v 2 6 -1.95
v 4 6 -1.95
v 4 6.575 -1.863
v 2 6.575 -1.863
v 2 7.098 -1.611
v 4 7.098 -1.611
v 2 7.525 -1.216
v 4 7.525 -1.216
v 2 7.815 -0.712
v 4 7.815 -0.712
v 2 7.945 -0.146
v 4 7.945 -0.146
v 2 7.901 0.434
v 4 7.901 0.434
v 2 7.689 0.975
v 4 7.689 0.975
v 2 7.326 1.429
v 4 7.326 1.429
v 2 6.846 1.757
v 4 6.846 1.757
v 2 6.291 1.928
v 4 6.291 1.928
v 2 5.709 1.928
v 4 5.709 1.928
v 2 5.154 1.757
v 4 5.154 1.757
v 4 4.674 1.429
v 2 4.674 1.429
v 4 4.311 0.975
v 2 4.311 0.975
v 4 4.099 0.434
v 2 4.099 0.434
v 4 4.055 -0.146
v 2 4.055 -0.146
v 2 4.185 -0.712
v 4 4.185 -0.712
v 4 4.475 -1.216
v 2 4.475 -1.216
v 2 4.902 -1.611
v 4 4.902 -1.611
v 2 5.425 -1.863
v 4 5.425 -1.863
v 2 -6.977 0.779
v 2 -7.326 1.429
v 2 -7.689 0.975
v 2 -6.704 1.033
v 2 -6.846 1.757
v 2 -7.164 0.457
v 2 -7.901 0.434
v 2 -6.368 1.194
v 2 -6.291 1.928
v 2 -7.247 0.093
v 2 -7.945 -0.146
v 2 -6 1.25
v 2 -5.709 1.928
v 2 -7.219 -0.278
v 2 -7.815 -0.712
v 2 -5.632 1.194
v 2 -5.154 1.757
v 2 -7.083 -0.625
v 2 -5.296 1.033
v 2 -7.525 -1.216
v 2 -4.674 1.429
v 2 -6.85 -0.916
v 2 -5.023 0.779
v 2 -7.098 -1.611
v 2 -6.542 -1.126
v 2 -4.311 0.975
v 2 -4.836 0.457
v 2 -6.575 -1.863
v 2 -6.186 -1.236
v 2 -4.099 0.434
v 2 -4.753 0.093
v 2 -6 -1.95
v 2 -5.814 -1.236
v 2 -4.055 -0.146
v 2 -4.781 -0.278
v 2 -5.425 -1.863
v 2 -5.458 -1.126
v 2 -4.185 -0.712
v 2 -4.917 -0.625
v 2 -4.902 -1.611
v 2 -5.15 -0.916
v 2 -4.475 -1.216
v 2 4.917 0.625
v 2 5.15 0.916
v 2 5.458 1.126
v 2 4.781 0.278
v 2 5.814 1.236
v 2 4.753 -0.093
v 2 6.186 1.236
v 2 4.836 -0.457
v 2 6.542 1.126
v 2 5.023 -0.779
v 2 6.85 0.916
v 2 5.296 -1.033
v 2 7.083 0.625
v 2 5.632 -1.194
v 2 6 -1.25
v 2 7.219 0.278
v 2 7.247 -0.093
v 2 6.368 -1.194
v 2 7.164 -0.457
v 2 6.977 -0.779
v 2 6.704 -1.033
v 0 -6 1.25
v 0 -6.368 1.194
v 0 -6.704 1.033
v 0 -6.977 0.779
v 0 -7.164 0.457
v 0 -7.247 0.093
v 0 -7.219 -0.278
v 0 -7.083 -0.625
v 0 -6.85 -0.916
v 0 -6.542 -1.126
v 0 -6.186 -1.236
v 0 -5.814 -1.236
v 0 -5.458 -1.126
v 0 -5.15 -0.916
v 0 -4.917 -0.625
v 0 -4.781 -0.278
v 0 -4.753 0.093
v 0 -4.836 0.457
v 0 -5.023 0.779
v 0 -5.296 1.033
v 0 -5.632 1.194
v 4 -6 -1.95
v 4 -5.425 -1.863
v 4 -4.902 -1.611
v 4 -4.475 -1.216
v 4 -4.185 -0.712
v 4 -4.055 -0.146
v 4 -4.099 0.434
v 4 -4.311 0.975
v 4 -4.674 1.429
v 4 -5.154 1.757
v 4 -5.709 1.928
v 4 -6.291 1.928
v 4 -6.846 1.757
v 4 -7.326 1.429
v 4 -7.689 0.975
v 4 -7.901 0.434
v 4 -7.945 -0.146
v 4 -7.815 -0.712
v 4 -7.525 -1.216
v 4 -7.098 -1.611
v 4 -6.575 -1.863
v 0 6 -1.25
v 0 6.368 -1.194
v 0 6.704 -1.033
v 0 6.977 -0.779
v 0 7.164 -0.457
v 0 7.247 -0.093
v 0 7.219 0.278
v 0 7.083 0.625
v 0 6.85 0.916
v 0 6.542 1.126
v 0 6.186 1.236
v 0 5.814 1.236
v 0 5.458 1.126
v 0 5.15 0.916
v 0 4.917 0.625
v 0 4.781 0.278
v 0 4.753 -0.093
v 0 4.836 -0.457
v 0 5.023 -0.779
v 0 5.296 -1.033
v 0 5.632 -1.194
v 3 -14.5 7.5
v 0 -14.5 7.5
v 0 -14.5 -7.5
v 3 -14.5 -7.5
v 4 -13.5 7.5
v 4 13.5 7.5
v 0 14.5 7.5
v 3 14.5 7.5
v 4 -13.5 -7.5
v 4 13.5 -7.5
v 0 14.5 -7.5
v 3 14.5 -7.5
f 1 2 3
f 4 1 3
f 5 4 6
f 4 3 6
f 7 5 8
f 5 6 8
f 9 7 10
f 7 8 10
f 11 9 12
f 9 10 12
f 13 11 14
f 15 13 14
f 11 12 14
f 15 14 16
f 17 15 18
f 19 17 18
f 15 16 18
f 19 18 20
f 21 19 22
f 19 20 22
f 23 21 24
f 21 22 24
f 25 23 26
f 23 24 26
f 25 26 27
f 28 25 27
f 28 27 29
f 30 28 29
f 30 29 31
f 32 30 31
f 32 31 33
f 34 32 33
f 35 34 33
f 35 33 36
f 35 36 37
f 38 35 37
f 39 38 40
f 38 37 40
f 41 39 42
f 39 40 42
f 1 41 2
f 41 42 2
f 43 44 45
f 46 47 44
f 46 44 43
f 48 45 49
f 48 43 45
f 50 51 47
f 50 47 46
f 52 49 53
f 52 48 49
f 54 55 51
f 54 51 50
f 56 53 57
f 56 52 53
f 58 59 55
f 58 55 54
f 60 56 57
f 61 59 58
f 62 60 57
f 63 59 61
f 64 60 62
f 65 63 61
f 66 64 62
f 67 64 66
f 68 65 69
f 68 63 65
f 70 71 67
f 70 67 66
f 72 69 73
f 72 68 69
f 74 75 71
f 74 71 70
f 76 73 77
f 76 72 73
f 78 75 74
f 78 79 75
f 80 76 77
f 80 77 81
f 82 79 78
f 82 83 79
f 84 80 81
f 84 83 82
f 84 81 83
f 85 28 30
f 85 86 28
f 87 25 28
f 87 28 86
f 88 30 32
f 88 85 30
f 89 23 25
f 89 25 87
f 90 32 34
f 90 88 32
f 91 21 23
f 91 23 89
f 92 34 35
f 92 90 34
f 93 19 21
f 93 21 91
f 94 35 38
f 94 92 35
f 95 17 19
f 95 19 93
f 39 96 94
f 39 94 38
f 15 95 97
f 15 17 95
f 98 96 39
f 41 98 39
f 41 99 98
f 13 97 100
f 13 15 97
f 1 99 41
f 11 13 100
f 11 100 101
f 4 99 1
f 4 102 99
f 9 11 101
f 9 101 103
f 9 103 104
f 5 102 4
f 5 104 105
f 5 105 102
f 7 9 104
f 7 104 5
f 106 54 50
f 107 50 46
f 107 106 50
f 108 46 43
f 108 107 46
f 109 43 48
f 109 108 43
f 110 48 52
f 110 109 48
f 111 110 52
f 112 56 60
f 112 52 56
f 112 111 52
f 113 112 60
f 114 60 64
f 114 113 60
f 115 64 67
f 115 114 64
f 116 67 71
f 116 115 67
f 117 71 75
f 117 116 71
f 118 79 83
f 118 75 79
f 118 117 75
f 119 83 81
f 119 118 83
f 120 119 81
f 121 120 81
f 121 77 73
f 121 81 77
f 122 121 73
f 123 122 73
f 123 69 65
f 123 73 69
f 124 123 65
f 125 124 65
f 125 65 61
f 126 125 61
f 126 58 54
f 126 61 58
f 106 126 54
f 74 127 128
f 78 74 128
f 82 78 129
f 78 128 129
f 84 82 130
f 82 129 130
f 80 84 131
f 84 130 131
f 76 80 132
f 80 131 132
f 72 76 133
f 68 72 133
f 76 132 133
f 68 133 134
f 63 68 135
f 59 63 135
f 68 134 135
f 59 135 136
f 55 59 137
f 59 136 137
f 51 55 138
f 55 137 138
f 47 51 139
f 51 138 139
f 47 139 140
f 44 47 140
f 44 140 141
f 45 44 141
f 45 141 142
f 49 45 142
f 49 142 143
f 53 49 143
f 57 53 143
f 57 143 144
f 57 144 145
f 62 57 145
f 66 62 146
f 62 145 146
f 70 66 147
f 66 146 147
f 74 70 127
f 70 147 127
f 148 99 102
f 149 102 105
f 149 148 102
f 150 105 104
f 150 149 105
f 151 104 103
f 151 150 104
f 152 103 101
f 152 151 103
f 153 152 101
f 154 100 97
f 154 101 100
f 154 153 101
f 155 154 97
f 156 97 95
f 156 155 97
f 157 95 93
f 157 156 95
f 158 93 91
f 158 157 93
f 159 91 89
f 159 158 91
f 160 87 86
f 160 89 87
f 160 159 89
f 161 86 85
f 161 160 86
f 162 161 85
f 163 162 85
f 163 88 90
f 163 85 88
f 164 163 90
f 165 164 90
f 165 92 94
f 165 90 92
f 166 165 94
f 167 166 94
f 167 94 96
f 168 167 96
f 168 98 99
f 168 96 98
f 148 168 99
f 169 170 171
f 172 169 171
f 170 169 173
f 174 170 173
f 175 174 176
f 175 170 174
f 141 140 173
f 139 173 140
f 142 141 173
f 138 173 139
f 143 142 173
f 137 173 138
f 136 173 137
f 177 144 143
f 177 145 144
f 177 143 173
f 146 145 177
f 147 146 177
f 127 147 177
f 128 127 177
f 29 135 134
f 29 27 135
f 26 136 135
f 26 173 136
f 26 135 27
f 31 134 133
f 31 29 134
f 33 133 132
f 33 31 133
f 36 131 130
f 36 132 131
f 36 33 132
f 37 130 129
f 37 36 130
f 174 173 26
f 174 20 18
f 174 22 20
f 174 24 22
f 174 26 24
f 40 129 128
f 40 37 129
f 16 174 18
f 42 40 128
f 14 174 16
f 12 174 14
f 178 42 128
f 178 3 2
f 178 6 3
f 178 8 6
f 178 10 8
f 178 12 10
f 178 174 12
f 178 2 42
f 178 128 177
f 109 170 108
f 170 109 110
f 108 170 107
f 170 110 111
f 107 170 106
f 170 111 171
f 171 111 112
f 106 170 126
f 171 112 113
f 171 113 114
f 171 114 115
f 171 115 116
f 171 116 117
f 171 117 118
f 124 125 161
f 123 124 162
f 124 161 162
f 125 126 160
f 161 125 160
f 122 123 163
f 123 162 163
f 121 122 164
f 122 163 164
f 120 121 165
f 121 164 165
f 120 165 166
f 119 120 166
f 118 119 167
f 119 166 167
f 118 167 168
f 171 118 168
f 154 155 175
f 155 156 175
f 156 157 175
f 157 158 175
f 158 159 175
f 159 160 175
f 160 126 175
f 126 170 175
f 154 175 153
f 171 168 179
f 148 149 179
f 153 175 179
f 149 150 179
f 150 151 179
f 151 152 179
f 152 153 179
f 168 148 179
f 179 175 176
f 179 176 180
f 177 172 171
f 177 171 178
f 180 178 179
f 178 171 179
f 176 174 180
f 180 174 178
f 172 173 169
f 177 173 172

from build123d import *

# Parameters (mm, degrees)
SKETCH_1_W          = 15
SKETCH_1_H          = 29
SKETCH_1_R          = 1.25
EXTRUDE_1_DEPTH     = 4
SKETCH_2_R          = 1.95
CUT_EXTRUDE_1_DEPTH = 2
CHAMFER_1_SIZE      = 1


with BuildPart() as part:
    # Эскиз1 → Бобышка-Вытянуть1 (new body)
    with BuildSketch(Plane(origin=(0, 0, 0), x_dir=(0, 0, -1), z_dir=(1, 0, 0))):
        Rectangle(SKETCH_1_W, SKETCH_1_H)
        with Locations((0, 6)):
            Circle(SKETCH_1_R, mode=Mode.SUBTRACT)
        with Locations(Location((0, -6, 0), (0, 0, 180))):
            Circle(SKETCH_1_R, mode=Mode.SUBTRACT)
    extrude(amount=EXTRUDE_1_DEPTH)

    # Эскиз2 → Вырез-Вытянуть1 (cut)
    with BuildSketch(Plane(origin=(4, 0, 0), x_dir=(0, 0, -1), z_dir=(1, 0, 0))):
        with Locations((0, 6)):
            Circle(SKETCH_2_R)
        with Locations((0, -6)):
            Circle(SKETCH_2_R)
    extrude(amount=-CUT_EXTRUDE_1_DEPTH, mode=Mode.SUBTRACT)

    # Фаска1
    chamfer_1_edges = [part.edges().sort_by_distance(p)[0] for p in [
        (4, -14.5, 0),
        (4, 14.5, 0),
    ]]
    chamfer(chamfer_1_edges, length=CHAMFER_1_SIZE)


solid = part.part
